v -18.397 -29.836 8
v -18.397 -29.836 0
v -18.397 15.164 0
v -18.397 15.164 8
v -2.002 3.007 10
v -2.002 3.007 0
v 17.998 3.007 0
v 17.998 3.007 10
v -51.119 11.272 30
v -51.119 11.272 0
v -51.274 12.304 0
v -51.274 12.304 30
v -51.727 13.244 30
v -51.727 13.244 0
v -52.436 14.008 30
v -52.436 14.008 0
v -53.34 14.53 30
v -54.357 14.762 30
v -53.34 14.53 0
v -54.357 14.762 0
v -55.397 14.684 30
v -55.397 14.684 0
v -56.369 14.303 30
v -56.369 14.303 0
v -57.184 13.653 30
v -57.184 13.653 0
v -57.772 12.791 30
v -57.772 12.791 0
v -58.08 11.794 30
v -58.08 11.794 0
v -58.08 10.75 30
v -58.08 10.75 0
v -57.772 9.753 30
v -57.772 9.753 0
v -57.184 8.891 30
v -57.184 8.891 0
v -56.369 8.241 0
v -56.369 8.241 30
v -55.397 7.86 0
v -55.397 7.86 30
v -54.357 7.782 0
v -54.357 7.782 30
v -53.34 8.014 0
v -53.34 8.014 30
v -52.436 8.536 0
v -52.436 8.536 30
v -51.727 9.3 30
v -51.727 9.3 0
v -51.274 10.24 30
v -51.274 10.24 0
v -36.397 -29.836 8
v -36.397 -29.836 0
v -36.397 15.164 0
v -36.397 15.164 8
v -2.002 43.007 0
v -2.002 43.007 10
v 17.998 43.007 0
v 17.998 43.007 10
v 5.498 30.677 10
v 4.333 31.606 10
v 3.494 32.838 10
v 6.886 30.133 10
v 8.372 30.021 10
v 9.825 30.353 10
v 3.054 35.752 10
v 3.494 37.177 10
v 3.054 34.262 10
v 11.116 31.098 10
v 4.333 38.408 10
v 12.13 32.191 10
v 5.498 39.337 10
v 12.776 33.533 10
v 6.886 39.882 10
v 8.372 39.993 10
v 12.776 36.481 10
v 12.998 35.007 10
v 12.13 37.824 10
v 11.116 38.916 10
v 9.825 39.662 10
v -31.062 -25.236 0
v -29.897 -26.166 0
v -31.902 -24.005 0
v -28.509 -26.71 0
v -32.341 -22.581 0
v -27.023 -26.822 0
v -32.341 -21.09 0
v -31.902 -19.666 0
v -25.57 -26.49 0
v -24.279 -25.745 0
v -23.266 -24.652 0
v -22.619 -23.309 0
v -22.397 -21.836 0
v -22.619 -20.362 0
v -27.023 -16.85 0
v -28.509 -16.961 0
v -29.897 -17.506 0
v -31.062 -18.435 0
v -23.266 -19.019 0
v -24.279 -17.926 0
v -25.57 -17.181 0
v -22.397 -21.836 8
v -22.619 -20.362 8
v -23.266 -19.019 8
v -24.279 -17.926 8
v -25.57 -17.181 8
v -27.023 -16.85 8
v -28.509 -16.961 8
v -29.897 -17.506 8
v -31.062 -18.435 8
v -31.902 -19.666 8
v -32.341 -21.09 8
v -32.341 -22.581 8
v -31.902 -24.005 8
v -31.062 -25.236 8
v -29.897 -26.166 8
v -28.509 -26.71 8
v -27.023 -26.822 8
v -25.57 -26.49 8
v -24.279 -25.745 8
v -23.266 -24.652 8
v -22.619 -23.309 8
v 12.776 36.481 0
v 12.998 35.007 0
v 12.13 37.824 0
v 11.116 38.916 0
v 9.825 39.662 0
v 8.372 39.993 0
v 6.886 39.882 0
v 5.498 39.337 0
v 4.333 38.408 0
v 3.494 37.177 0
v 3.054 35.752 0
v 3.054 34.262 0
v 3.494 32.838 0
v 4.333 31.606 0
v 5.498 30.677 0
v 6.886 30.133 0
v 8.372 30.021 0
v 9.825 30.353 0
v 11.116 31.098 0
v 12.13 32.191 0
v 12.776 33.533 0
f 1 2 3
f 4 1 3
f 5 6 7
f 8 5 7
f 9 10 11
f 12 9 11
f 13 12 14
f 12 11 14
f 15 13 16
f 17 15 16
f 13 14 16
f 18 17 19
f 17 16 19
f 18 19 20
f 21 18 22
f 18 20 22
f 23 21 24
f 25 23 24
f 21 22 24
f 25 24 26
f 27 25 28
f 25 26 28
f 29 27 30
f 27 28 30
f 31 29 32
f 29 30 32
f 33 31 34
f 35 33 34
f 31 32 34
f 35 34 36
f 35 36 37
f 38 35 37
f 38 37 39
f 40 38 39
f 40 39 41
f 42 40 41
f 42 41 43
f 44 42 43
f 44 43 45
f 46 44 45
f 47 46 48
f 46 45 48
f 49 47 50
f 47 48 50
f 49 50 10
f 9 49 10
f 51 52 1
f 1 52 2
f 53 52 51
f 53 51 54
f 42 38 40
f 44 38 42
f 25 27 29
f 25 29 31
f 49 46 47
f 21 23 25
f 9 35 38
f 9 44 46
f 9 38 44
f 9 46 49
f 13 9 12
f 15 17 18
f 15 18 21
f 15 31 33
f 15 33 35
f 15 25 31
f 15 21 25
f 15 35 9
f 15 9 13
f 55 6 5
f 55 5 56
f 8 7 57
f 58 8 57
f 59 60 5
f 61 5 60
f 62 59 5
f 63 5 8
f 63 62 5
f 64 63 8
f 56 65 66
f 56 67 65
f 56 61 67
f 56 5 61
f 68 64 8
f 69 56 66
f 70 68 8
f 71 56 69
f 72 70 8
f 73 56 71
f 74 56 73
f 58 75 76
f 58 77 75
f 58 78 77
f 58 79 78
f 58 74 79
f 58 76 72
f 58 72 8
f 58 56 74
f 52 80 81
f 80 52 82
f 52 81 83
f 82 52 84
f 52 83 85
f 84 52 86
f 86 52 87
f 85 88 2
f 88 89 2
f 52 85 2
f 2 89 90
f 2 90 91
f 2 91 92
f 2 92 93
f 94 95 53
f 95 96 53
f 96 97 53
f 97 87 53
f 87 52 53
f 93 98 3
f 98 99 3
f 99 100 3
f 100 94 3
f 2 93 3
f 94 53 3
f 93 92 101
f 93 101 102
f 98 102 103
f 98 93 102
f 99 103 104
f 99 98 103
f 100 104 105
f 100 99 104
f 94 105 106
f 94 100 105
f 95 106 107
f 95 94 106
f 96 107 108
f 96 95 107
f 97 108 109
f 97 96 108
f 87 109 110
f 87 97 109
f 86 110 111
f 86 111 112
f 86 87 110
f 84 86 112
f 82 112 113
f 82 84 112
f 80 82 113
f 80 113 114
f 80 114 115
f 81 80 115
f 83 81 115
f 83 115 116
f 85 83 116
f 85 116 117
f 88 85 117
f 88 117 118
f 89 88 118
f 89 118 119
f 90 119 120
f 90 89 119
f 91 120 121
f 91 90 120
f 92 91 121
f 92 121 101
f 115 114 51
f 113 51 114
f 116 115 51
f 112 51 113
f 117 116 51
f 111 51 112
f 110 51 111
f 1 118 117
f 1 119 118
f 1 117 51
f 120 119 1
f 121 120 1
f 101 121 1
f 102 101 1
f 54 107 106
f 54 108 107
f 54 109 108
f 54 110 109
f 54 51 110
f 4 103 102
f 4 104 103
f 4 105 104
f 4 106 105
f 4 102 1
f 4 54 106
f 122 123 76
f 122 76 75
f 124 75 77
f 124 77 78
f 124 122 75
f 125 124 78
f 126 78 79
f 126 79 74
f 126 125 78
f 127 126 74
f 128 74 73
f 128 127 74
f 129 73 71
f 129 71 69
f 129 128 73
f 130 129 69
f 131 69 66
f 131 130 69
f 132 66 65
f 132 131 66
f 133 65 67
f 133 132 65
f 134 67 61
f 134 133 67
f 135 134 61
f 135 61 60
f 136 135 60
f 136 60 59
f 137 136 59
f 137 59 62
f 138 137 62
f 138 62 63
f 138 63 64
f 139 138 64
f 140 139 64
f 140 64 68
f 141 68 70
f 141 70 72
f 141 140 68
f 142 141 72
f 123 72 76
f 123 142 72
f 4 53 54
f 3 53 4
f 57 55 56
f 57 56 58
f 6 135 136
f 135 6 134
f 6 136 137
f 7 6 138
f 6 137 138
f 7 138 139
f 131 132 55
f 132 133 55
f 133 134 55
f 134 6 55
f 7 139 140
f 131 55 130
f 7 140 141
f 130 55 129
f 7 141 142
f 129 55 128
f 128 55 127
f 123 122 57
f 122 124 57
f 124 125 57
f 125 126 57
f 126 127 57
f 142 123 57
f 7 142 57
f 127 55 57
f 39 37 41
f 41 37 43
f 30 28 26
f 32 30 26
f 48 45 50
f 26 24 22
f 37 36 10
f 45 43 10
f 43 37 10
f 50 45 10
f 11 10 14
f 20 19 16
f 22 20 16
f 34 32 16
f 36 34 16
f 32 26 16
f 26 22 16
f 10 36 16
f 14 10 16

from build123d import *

# Parameters (mm, degrees)
F0_W     = 20
F0_H     = 40
F0_R     = 5
F1_DEPTH = 10
F2_R     = 3.5
F3_DEPTH = 30
F4_W     = 18
F4_H     = 45
F4_R     = 5
F5_DEPTH = 8


with BuildPart() as f1:
    # F0 (on Top) → F1 (new body)
    with BuildSketch(Plane.XY):
        with Locations((7.998349, 23.00726)):
            Rectangle(F0_W, F0_H)
        with Locations((7.998349, 35.00726)):
            Circle(F0_R, mode=Mode.SUBTRACT)
    extrude(amount=F1_DEPTH)


with BuildPart() as f3:
    # F2 (on Top) → F3 (new body)
    with BuildSketch(Plane.XY):
        with Locations((-54.618616, 11.272082)):
            Circle(F2_R)
    extrude(amount=F3_DEPTH)


with BuildPart() as f5:
    # F4 (on Top) → F5 (new body)
    with BuildSketch(Plane.XY):
        with Locations((-27.396696, -7.335631)):
            Rectangle(F4_W, F4_H)
        with Locations((-27.396696, -21.835631)):
            Circle(F4_R, mode=Mode.SUBTRACT)
    extrude(amount=F5_DEPTH)


solid = Compound([f1.part, f3.part, f5.part])
